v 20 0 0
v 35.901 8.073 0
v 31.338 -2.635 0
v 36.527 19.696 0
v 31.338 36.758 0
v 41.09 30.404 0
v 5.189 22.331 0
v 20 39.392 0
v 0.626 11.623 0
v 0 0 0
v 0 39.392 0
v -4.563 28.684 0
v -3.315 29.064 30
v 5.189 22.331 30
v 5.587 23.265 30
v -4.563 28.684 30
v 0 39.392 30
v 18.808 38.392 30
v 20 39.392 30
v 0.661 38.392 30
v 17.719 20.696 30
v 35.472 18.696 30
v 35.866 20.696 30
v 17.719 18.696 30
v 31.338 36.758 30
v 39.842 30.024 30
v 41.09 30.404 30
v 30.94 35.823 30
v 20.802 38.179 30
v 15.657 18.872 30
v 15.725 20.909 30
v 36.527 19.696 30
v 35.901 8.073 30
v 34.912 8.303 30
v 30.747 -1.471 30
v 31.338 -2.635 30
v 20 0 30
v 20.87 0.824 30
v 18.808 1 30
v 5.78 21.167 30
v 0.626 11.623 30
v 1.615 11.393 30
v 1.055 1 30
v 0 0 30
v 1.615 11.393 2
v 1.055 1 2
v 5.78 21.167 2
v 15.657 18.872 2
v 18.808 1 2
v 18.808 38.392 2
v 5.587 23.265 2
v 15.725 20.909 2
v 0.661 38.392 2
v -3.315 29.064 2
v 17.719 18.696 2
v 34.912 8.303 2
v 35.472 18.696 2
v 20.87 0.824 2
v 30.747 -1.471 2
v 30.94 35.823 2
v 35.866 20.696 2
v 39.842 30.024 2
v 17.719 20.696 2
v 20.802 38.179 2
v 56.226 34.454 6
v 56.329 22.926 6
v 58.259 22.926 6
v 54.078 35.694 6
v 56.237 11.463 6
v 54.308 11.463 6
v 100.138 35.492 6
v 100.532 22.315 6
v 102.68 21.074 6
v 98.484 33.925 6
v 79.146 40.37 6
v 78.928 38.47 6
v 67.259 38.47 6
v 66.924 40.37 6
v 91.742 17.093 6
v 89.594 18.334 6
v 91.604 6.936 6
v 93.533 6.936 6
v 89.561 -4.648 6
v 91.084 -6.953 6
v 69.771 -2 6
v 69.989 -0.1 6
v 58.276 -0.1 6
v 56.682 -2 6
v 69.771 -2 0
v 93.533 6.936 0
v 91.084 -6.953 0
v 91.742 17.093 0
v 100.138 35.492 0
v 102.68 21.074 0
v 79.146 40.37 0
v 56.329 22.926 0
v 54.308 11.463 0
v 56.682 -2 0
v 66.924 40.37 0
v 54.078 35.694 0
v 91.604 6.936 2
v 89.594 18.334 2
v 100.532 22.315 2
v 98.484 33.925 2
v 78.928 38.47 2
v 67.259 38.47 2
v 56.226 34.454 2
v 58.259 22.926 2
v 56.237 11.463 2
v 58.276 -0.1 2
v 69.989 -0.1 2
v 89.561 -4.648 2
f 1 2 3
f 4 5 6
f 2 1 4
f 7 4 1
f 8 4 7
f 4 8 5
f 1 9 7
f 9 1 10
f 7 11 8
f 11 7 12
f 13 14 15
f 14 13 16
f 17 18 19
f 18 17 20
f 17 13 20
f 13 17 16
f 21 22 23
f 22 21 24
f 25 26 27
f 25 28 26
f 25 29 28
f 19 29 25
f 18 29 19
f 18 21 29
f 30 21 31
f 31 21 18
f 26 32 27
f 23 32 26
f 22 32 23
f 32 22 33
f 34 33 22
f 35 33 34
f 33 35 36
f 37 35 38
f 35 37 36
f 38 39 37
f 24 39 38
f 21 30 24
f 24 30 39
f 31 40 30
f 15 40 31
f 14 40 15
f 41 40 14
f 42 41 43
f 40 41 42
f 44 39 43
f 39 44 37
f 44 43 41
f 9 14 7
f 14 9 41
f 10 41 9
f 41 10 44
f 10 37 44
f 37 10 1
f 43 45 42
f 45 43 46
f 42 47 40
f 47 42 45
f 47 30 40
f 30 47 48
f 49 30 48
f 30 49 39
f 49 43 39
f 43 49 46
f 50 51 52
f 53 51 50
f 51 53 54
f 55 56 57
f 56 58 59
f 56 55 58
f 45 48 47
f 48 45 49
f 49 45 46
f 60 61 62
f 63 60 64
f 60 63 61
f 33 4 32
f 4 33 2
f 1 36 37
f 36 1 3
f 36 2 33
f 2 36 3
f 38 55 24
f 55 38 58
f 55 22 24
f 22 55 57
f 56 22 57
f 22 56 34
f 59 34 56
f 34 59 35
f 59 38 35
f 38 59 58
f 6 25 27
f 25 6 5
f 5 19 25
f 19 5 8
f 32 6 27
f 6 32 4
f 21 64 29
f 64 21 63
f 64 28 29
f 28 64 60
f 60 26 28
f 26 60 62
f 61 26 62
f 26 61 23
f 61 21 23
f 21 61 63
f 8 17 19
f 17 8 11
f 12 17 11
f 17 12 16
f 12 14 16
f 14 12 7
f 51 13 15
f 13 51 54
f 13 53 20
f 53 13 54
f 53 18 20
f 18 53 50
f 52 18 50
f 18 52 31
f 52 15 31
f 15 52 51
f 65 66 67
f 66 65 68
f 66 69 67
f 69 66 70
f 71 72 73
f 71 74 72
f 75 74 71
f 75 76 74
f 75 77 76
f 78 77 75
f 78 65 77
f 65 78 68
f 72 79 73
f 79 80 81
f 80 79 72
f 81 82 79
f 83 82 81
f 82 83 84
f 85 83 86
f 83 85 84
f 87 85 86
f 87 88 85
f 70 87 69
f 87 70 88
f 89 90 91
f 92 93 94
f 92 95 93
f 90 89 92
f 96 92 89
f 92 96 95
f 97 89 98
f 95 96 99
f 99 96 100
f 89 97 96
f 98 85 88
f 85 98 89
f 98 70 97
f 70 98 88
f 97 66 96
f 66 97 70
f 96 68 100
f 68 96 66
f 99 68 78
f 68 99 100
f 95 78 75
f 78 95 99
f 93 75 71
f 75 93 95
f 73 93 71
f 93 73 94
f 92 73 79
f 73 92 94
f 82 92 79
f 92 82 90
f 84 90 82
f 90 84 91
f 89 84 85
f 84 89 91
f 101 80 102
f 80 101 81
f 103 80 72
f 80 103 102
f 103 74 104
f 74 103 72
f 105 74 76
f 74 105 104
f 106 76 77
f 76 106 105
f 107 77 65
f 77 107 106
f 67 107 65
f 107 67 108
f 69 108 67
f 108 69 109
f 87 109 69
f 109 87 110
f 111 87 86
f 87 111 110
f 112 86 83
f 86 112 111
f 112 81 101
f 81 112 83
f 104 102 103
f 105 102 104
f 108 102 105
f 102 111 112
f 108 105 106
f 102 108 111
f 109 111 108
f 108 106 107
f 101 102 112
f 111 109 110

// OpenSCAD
// file: Type6-tiles.scad
use <../lib/tile_fns-v19.scad>


/* Type 6 
   Kershner 1968
   
   a=d=e
   b=c
   B+D=180
   2B=E
   
   parameters : B
   
     B = 1,29 concave, 30-90 convex, 91-141 concave

   solution by trig
   
*/

function Type6(B) =
    let(a=2*sin(B/2)/sqrt(1+4*cos(B/2)*cos(B/2) - 4*cos(B/2)*cos(3*B/2)))
    let(gamma = asin(a*sin(3*B/2)/(2*sin(B/2))))
    let(C= 90 + gamma)    
    [[1,B],[1,C],[a,180-B],[a,2*B],[a,360-2*B-C]];

function Type6_tiles(B,n,m)=
let(peri=Type6(B))
let(tile=peri_to_tile(peri))

let(assembly = [
    [[0,0]],
    [[0,1],[0,1]],
    [[0,1],[1,0]],
    [[0,0],[2,0]]
    ])
let(unit = group_tiles([tile],assembly))

let(dy=tile_offset(unit,[0,0],[3,1]))
let(dx=tile_offset(unit,[0,4],[1,4]))

tesselate_tiles(unit,n,m,dx,dy);
// main file
use <../lib/tile_fns-v19.scad>
use <../pentagonal-tiles/Type6-tiles.scad>

scale=20;
inset=1;
n=1;
m=1;
B=80;
tiles =Type6_tiles(B,n,m);
echo(tiles);
ftiles=scale_tiles(flatten(tiles),scale);

gt = tiles_to_tile(ftiles);

for (i=[0:len(ftiles)-1]) {
    tile = ftiles[i];
    linear_extrude(height=30+i*0)
       difference() {
           fill_tile(tile);
           fill_tile(inset_tile(tile,inset));
       }
    linear_extrude(height=2)
       fill_tile(tile); 
}

//lid
translate([70,0,6])

rotate([0,180])
{
   linear_extrude(height=6) 
      difference() {
          fill_tile(inset_tile(gt,-2));
          fill_tile(inset_tile(gt,-0.1));
      }
   translate([0,0,4])
      linear_extrude(height=2)
         fill_tile(inset_tile(gt,-2));
}   
